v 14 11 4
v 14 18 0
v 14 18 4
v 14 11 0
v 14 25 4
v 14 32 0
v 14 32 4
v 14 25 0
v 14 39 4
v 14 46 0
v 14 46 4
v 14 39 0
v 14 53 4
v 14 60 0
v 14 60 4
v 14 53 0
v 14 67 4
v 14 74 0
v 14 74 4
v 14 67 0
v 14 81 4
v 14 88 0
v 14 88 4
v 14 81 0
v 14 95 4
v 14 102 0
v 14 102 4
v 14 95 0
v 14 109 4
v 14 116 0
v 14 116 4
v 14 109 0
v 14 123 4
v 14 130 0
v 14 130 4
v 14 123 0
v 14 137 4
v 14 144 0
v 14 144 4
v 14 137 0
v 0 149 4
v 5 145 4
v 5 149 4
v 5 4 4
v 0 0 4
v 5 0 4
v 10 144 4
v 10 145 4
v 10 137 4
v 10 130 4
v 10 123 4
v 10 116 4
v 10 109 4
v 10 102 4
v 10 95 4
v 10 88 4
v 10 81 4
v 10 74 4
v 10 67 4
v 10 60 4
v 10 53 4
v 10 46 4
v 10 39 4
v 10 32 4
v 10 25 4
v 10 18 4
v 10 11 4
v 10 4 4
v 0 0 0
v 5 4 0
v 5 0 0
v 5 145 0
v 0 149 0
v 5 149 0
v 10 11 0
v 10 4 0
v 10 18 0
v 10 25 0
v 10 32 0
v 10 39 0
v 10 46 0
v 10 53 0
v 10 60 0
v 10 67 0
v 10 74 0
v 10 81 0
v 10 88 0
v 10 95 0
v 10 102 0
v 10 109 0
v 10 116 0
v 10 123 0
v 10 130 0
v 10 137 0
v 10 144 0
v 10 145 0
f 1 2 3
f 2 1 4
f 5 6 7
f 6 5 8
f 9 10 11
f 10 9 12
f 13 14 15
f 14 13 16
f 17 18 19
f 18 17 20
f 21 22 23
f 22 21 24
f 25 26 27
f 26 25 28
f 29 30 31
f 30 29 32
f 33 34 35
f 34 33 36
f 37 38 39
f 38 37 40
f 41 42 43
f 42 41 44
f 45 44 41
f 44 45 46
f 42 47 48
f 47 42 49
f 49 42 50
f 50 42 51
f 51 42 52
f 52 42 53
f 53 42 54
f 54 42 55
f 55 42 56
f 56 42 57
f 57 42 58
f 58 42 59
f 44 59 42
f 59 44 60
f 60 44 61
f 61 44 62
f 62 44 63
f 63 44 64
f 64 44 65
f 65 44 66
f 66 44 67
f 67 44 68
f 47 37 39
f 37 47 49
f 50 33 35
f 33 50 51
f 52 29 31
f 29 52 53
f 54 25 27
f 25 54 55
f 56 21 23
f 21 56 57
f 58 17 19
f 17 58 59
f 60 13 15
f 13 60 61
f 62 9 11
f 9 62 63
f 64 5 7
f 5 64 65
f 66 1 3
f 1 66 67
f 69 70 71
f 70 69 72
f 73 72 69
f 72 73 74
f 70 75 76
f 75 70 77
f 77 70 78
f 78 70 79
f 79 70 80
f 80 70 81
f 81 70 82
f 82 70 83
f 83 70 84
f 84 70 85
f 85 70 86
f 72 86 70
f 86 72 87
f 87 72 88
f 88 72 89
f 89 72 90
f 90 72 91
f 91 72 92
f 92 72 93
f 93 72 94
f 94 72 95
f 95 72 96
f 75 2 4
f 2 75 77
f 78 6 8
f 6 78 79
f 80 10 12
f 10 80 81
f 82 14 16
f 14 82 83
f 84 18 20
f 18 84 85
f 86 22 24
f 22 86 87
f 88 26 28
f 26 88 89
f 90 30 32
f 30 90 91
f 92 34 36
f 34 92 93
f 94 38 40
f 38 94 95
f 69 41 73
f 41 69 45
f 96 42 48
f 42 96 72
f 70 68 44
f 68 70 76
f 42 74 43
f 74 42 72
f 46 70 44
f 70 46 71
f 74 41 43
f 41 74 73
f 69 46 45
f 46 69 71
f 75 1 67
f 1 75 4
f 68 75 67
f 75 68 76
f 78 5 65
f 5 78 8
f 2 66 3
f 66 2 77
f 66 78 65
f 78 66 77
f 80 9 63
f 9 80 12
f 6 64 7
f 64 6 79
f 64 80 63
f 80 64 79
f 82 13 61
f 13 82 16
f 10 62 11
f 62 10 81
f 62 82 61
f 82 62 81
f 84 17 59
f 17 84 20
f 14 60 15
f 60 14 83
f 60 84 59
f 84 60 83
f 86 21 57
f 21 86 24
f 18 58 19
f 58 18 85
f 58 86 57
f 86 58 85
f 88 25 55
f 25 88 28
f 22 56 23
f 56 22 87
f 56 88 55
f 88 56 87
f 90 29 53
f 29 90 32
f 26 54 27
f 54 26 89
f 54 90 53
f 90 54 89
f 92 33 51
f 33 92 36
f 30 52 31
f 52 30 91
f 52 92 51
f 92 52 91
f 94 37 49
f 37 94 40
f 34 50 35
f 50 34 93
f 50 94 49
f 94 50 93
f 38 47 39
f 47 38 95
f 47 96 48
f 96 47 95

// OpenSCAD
// file: utils/crenel.scad
include <../dimensions.scad>

margin = 2;

module crenel(repetitions, size = 10) {
  for(i=[1:repetitions]) {
    translate([2 * size * (i -1), -margin, -margin])
    cube([size, $materialThickness + margin, $materialThickness + 2 * margin]);
  }
}

module hole_crenel(repetitions, size = 10) {
  for(i=[1:repetitions]) {
    translate([2 * size * (i -1), 0, -margin])
      cube([size, $materialThickness, $materialThickness + 2 * margin]);
  }
}
// file: dimensions.scad
/*
 * This file regroup all the common dimensions, angles, and repetitions
 */

// how many harmonica do you want to store on a given row?
$horizontalPlacements = 5;
$verticalPlacements = 3;

/* hole around the harmonica
 *    ______________
 *   /             /|
 *  /_____________/ | <- height_gap
 *  |             | |
 *  |             | /
 *  |_____________|/ <- thick_gap
 *       ^ length_gap
 */
$thickGap = 25;
//$height_gap = 30; <- this one was a bit tight for Seydels and too tight for the old golden melody
$heightGap = 35; // <- I'll increase that somewhat so I can also install some felt inside the box.
$lengthGap = 105;

// base material thickness, this represent the thickness of the most commonly used material.
$materialThickness = 4;

/* On different rows, harmonica will be seating more or less deelply inside (higher rows deepers than lower ones).
 * You'll probably want to tweak that a bit:
 * - make then seat far enough that the lid doesn't need to be too huge to cover them
 * - not too far so that they are easy to pick up
 * - have a good difference between the different rows so you can see them all nicely
*/
$minHarpSeating = 55;
$maxHarpSeating = 85;

// the difference between the harp seatings dictates how slanted should the inside slant be.
deltaSeating = $maxHarpSeating - $minHarpSeating;
deltaHeight = ($heightGap + $materialThickness) * ($verticalPlacements - 1);
$slantAngle = 90 - atan(deltaHeight / deltaSeating);
echo("slant angle -> ", $slantAngle);


/*
 * inset looks like: 
 *
 * =================================== <- outset border
 * |\
 * | \ <-     maxHarpSeating     ->
 * |  \----------------------------
 * |   \
 * |    \
 * |     \-------------------------      <- vertical separator
 * |      \
 * |       \
 * |        \----------------------
 * | slant ->\
 * |          \<- minHarpSeating ->
 * ===================================
 *                                 \_/ 
 *                                  ^outsetMargin
 *  \_________insetLength_________/
 */

// how far should the inset goes?
insetHeight = $heightGap + ($heightGap + $materialThickness) * ($verticalPlacements - 1);
slantDeltaLength = insetHeight * deltaSeating / deltaHeight;
$insetMargin = 10;
$insetLength = $minHarpSeating + slantDeltaLength + $materialThickness + $insetMargin;
echo("insetLength -> ", $insetLength);
// how much futher should the outset cover?
$outsetMargin = 5;

// Box dimensions: 
$boxWidth = $horizontalPlacements * ($thickGap + $materialThickness) + $materialThickness;
$boxHeight = $insetLength + $outsetMargin;
$boxDepth = $verticalPlacements * ($heightGap + $materialThickness) + $materialThickness;

// the angle at which the box should sit when the lid is opened
// !TODO adjust the angle if you want a flat part on the top of the standing lid
$boxTiltingAngle = 35;
// main file
/*
 * This file models the lid.
 * it has 2 parts, the part that can be used as a stand, and the other one.
 *
 * the stand part is a bit shorter and will hold a lock part that can attach to close the lid or to fix the cover in an open position.
 *
 */

include <./dimensions.scad>
use <./utils/crenel.scad>



/*
 *   lid-radius     flat length
 * <-------><------------------------------------->
 *         , - ~ ~ ~ ~ ~ ~ ~ ~ ~ ~ ~ ~ ~ ~ ~ ~ ~ - ,                      ^ ^
 *     , '   |                             /       | ' ,                  | |
 *   ,                                    /              ,                | | lid-radius
 *  ,        |                           /         |      ,               | |
 * ,             other wedge            /                  ,              | |
 * ,         |                         /           |       ,              | V
 * |                                  /                    | ^            |
 * |         |                       /   stand     |       | |            |
 * |                                /    wedge             | | height     | lidHeight
 * |         |                     /               |       | | clearance  |
 * |                              /                        | |            |
 * |_________|___________________/_________________|_______| V            V
 * <------------------------------------><--------------->
 *           otherLid top                     standLid top
 * <----------------------------><------------------------->
 *         otherLid base                   standLid base
 * <------------------------------------------------------->
 *          box-depth = verticalPlacements * (heightGap + materialThickness) + materialThickness
 */

margin = 2;

lidRadius = $heightGap * 2/3;
heightClearance =  $lengthGap - $minHarpSeating + margin;
lidHeight = lidRadius + heightClearance;
flatLenght = $boxDepth - 2 * lidRadius;


standLidBase_ = $boxHeight * tan($boxTiltingAngle);
standLidTop_ = (standLidBase_ * ($boxHeight - lidHeight)) / $boxHeight;
echo("before potential correction");
echo("standLidBase -> ", standLidBase_);
echo("standLidTop -> ", standLidTop_);
standLidTop = (standLidTop_ < lidRadius)? lidRadius: standLidTop_;
standLidBase = (standLidTop_ < lidRadius)? standLidTop * $boxHeight / ($boxHeight - lidHeight) : standLidBase_;
echo("after potential correction");
echo("standLidBase -> ", standLidBase);
echo("standLidTop -> ", standLidTop);
otherLidTop = $boxDepth - standLidTop;
otherLidBase = $boxDepth - standLidBase;

module rawLid() {
  cube([heightClearance, $boxWidth, $boxDepth]);
  translate([heightClearance, 0, lidRadius])
    cube([lidRadius, $boxWidth, flatLenght]);
  translate([heightClearance, 0, lidRadius])
    rotate([-90, 0, 0])
      cylinder($boxWidth, r = lidRadius, center = false);
  translate([heightClearance, 0, flatLenght + lidRadius])
    rotate([-90, 0, 0])
      cylinder($boxWidth, r = lidRadius, center = false);
}

// translate([1.5 * lidHeight, 0, 0])
  // rawLid();

module stabiliser() {
  w = round(width * 0.05);
  translate([0, $materialThickness, 0])
  difference() {
    union() {
      cube([10 + $materialThickness, width - 2 * $materialThickness, $materialThickness]);

      translate([0, -$materialThickness, 0])
        cube([5, width, $materialThickness]);

    }


    translate([10 + $materialThickness, 0, 0])
      rotate([0, 0, 90])
      crenel(11, w);
  }
}
!stabiliser();

standWedgePoints = [
  [0, 0, 0], // 0
  [0, $materialThickness, 0], // 1
  [lidHeight, $materialThickness, 0], // 2
  [lidHeight, 0, 0], // 3
  [lidHeight, 0, standLidTop - lidRadius], // 4
  [lidHeight, $materialThickness, standLidTop - lidRadius], // 5
  [0, $materialThickness, standLidBase - lidRadius], // 6
  [0, 0, standLidBase - lidRadius], // 7
];


standWedgeFaces = [
  [3, 2, 1, 0], // A
  [2, 3, 4, 5], // B
  [0, 7, 4, 3], // C
  [1, 2, 5, 6], // D
  [4, 7, 6, 5], // E
  [0, 1, 6, 7], // F
];

module standSide() {
  difference() {
    union() {
      cube([heightClearance, $materialThickness, lidRadius]);
      translate([heightClearance, 0, lidRadius])
        difference() {
          rotate([-90, 0, 0])
            cylinder($materialThickness, r = lidRadius - $materialThickness, center = false);
          translate([-lidRadius, -5, 0])
            cube([2 * lidRadius, 10 + $materialThickness, 2* lidRadius]);
          translate([-2*lidRadius,-5,-lidRadius])
            cube([2 * lidRadius,10 + $materialThickness, 2* lidRadius]);
        }
      translate([0,0, lidRadius])
        polyhedron(standWedgePoints, standWedgeFaces);
    }
    translate([heightClearance / 12, $materialThickness, 0])
      rotate([90, 0, 0])
      crenel(6, heightClearance / 12);
    translate([heightClearance - margin, 0, -$materialThickness])
      cube($materialThickness + 2 * margin);

    translate([lidHeight - $materialThickness, -$materialThickness, 0])
      cube([2*$materialThickness, 3* $materialThickness, 2 *standLidTop]);
  }
}

module standCover() {
  difference() {
    union () {
      cube([heightClearance, $boxWidth, $materialThickness]);
      if(standLidTop > lidRadius) {
        translate([lidHeight - $materialThickness, 0, lidRadius])
          #cube([$materialThickness, $boxWidth, standLidTop - lidRadius]);
      }

      translate([heightClearance, 0, lidRadius])
      rotate([-90, 0, 0])
      difference() {
        cylinder($boxWidth, r = lidRadius, center = false);
        translate([0, 0, -margin])
          cylinder($boxWidth + 2*margin, r = lidRadius - $materialThickness, center = false);
        translate([-$boxWidth, -$boxWidth, -$boxWidth/2])
          cube([2 * $boxWidth, $boxWidth, 2* $boxWidth]);
        translate([-$boxWidth,-$boxWidth,-$boxWidth/2])
          cube([$boxWidth, 2* $boxWidth, 2* $boxWidth]);
      }
    }

    crenel(6, heightClearance / 12);
    translate([0, $boxWidth, $materialThickness])
      rotate([180, 0, 0])
      crenel(6, heightClearance / 12);
  }
}

module standLid(spread = false) {
  color("white")
  standSide();
  color("white")
  translate([0, $boxWidth - $materialThickness + (spread? 10 : 0), 0])
    standSide();
  color("blue")
  translate([0, spread? 5 : 0, 0])
    standCover();
}
// translate([0, $boxWidth, $boxDepth + 0*margin ])
// rotate([180, 0, 0])
// color("blue")
 !standLid();

otherWedgePoints = [
  [0, 0, 0], // 0
  [0, $materialThickness, 0], // 1
  [lidHeight, $materialThickness, 0], // 2
  [lidHeight, 0, 0], // 3
  [lidHeight, 0, otherLidTop - lidRadius], // 4
  [lidHeight, $materialThickness, otherLidTop - lidRadius], // 5
  [0, $materialThickness, otherLidBase - lidRadius], // 6
  [0, 0, otherLidBase - lidRadius], // 7
];
otherWedgeFaces = standWedgeFaces;

module otherStandSide() {
  cube([heightClearance, $materialThickness, lidRadius]);
  translate([heightClearance, 0, lidRadius])
    difference() {
      rotate([-90, 0, 0])
        cylinder($materialThickness, r = lidRadius - $materialThickness, center = false);
      translate([-lidRadius, -5, 0])
        cube([2 * lidRadius, 10 + $materialThickness, 2* lidRadius]);
      translate([-2*lidRadius,-5,-lidRadius])
        cube([2 * lidRadius,10 + $materialThickness, 2* lidRadius]);
    }
  translate([0, 0, lidRadius])
    polyhedron(otherWedgePoints, otherWedgeFaces);
}

module otherCover() {
  cube([heightClearance, $boxWidth, $materialThickness]);
  translate([lidHeight - $materialThickness, 0, lidRadius])
    cube([$materialThickness, $boxWidth, otherLidTop - lidRadius]);

  translate([heightClearance, 0, lidRadius])
  rotate([-90, 0, 0])
  difference() {
    cylinder($boxWidth, r = lidRadius, center = false);
    translate([0, 0, -margin])
      cylinder($boxWidth + 2*margin, r = lidRadius - $materialThickness, center = false);
    translate([-$boxWidth, -$boxWidth, -$boxWidth/2])
      cube([2 * $boxWidth, $boxWidth, 2* $boxWidth]);
    translate([-$boxWidth,-$boxWidth,-$boxWidth/2])
      cube([$boxWidth, 2* $boxWidth, 2* $boxWidth]);
  }
}

module otherLid() {
  otherStandSide();
  translate([0, $boxWidth - $materialThickness, 0])
  otherStandSide();
  otherCover();
}
//otherLid();

lidDepth = ($heightGap * $verticalPlacements + $materialThickness * ($verticalPlacements + 1)) / 2;
echo("lidDepth -> ", lidDepth);
width = $thickGap * $horizontalPlacements + ($horizontalPlacements + 1) * $materialThickness;
// TODO compute that one based on the insideHeight, the outsetMargin and the slant angle
flatHeight = ceil(($lengthGap + ($heightGap + ($heightGap + $materialThickness) * ($verticalPlacements -1))/tan(90-$slantAngle)) - $insetLength - $outsetMargin) + 2* margin;
echo("flatHeight -> ", flatHeight);

circularRadius = 2 * lidDepth/3;
echo("Circular radius -> ", circularRadius);

bodyLength = $insetLength + $outsetMargin;

wedgeLength =  floor(circularRadius * bodyLength/(bodyLength - flatHeight - circularRadius) - circularRadius);
echo("wedge length -> ", wedgeLength);

$angle = floor(asin((wedgeLength + circularRadius) / (bodyLength)));
echo("angle -> ", $angle);

wedgePoints = [
  [0, 0, wedgeLength], // 0
  [flatHeight + circularRadius, 0, 0], // 1
  [0,0,0], // 2
  [0, $materialThickness, wedgeLength], // 3
  [flatHeight + circularRadius, $materialThickness, 0], // 4
  [0, $materialThickness, 0] // 5
];
wedgeFaces = [
 [0, 1, 2],
 [3, 4, 1, 0],
 [3, 5, 4],
 [4, 5, 2, 1],
 [5, 3, 0, 2]
];

module roundedCorner(r = circularRadius) {
  difference() {
    rotate([-90, 0, 0])
      cylinder($materialThickness, r = r, center = false);

    translate([- r - margin, - margin, 0])
      cube([2 * r + 2 * margin, $materialThickness + 2 * margin, r + margin]);

    translate([- margin - r, - margin, -r - margin])

      cube([r + margin, $materialThickness + 2 * margin, 2 * r + 2 * margin]);
  }
}

module roundedTop() {
  translate([0, width/2, circularRadius ])
    rotate([90, 0, 0])
    difference() {
      cylinder(width, r = circularRadius, center = true);

      cylinder(width + 2 * margin, r = circularRadius - $materialThickness, center = true);

      translate([- circularRadius - margin, - circularRadius - margin, - (width + margin) / 2])
        cube([circularRadius + margin, (circularRadius + margin)* 2, width +  margin]);

      translate([- circularRadius - margin, 0, - (width + margin) / 2])
        cube([(circularRadius + margin)* 2, circularRadius + margin, width +  margin]);
    }
}

module roundedSideFlatten() {
  w = round(width * 0.05);
  flattenLength = PI * .5 * (circularRadius - $materialThickness);

  difference() {
    cube([flatHeight + flattenLength, width, $materialThickness]);

    translate([flatHeight + flattenLength, $materialThickness + w, 0])
      rotate([0, 0, 90])
      crenel(10, w);

    translate([$materialThickness, 0, 0])
    crenel(3, $materialThickness);

    translate([$materialThickness, width, $materialThickness])
    rotate([180, 0, 0])
      crenel(3, $materialThickness);
  }
}

module roundedSide() {
  w = round(width * 0.05);
  crenelOffset = round((width - w * 20) / 2);
  difference() {
    union() {
      cube([flatHeight, width, $materialThickness]);

      translate([flatHeight, 0, 0])
        roundedTop();
    }
    translate([flatHeight + circularRadius - $materialThickness, $materialThickness + w, circularRadius - margin])
      rotate([90, 0, 90])
      crenel(10, w);

    translate([$materialThickness, 0, 0])
    crenel(3, $materialThickness);

    translate([$materialThickness, width, $materialThickness])
    rotate([180, 0, 0])
      crenel(3, $materialThickness);
  }
}

module standSide_() {
  difference() {
    union() {
      cube([flatHeight, $materialThickness, circularRadius]);

      translate([flatHeight, 0, circularRadius])
        roundedCorner(circularRadius - $materialThickness);

      translate([0, 0, circularRadius])
        polyhedron(wedgePoints, wedgeFaces);
    }
    translate([0, $materialThickness, 0])
      rotate([90,0,0])
      crenel(4, $materialThickness);

    translate([2 * $materialThickness * 3,-$materialThickness, - $materialThickness])
      cube([3 * $materialThickness, 3 * $materialThickness, $materialThickness + 2 * margin ]);

    translate([flatHeight + circularRadius - $materialThickness - 10, - 10 + $materialThickness / 2, circularRadius - $materialThickness])
      cube([5, 20, $materialThickness]);

    translate([flatHeight + circularRadius - $materialThickness,-margin,circularRadius])
      cube([$materialThickness, 2 * margin + $materialThickness, $materialThickness]);
  }
}

module standLid_() {
  standSide_();

  color("red")
  translate([0, width - $materialThickness, 0])
    standSide_();

  color("blue")
  roundedSide();

  color("green")
  translate([flatHeight + circularRadius - $materialThickness - 10, 0, circularRadius - $materialThickness])
    stabiliser();
}


module otherSide() {
  difference() {
    union() {
      difference() {
        cube([flatHeight, $materialThickness, lidDepth]);

        translate([0, $materialThickness, lidDepth - $materialThickness + margin])
          rotate([90, 0, 0])
          crenel(4, $materialThickness);

        translate([2 * $materialThickness * 3,-$materialThickness, lidDepth - $materialThickness])
          cube([3 * $materialThickness, 3 * $materialThickness, $materialThickness + 2 * margin ]);
      }

      translate([flatHeight, 0, lidDepth - circularRadius])
        rotate([0,-90, 0])
        roundedCorner(circularRadius - $materialThickness);

      difference() {
        translate([0, 0, -lidDepth + circularRadius])
          cube([flatHeight + circularRadius, $materialThickness, (lidDepth - circularRadius) * 2]);


        translate([flatHeight + circularRadius, 0, 3.5 * $materialThickness])
          rotate([0,90,90])
          crenel(4, $materialThickness);
      }
    }

    translate([0, 0, -lidDepth])
      union() {
        standSide_();
        // some quick rendering cleanup
        translate([0, 0.5 * $materialThickness, 0])
          standSide_();
        translate([0, -0.5 * $materialThickness, 0])
          standSide_();
      }

    translate([flatHeight,-$materialThickness, - (2 * lidDepth - 2* circularRadius ) + margin])
      cube([circularRadius - $materialThickness, 3 * $materialThickness, 3 * $materialThickness]);
  }
}

module otherRoundedSide() {
  union() {
    difference() {
      translate([0, 0, lidDepth - $materialThickness])
        cube([flatHeight, width, $materialThickness]);

      translate([$materialThickness,0, lidDepth - $materialThickness])
        rotate([0, 0, 0])
        crenel(3, $materialThickness);

      translate([$materialThickness,width, lidDepth ])
        rotate([180, 0, 0])
        crenel(3, $materialThickness);
    }

    translate([flatHeight, width, lidDepth])
      rotate([180, 0, 0])
      roundedTop();

    difference() {
      translate([flatHeight + circularRadius - $materialThickness, 0, - lidDepth + circularRadius])
        cube([$materialThickness, width, (lidDepth - circularRadius) * 2]);

      translate([flatHeight + circularRadius - $materialThickness, 0, lidDepth - circularRadius - $materialThickness / 2])
        rotate([0, 90, 0])
        crenel(3, $materialThickness);

      translate([flatHeight + circularRadius - $materialThickness, width - $materialThickness + margin, lidDepth - circularRadius - $materialThickness / 2])
        rotate([0, 90, 0])
        crenel(3, $materialThickness);
    }
  }
}

module otherRoundedSideFlatten() {
  flattenLength = PI * .5 * (circularRadius - $materialThickness);

  translate([0, 0, -lidDepth + $materialThickness])
  union() {
    difference() {
      translate([0, 0, lidDepth - $materialThickness])
        cube([flatHeight + flattenLength, width, $materialThickness]);

      translate([$materialThickness,0, lidDepth - $materialThickness])
        rotate([0, 0, 0])
        crenel(3, $materialThickness);

      translate([$materialThickness,width, lidDepth ])
        rotate([180, 0, 0])
        crenel(3, $materialThickness);
    }

    translate([flatHeight + flattenLength,0,lidDepth])
    rotate([0, 90, 0])
    difference() {
      translate([0, 0, 0])
        cube([$materialThickness, width, (lidDepth - circularRadius) * 2]);

      translate([0, 0, (lidDepth - circularRadius) * 2 - $materialThickness / 2])
        rotate([0, 90, 0])
        crenel(3, $materialThickness);

      translate([0, width - $materialThickness + margin, (lidDepth - circularRadius) * 2 - $materialThickness / 2])
        rotate([0, 90, 0])
        crenel(3, $materialThickness);
    }

    translate([flatHeight + flattenLength - 4, 0, lidDepth - $materialThickness])
    cube([5, width, $materialThickness]);
  }
}

module lid(spread = false) {
  color("blue")
    standLid();

  translate([0, $boxWidth, $boxDepth + (spread? 25: 0)])
    rotate([180, 0, 0])
    otherLid();
}



lid(spread = true);
